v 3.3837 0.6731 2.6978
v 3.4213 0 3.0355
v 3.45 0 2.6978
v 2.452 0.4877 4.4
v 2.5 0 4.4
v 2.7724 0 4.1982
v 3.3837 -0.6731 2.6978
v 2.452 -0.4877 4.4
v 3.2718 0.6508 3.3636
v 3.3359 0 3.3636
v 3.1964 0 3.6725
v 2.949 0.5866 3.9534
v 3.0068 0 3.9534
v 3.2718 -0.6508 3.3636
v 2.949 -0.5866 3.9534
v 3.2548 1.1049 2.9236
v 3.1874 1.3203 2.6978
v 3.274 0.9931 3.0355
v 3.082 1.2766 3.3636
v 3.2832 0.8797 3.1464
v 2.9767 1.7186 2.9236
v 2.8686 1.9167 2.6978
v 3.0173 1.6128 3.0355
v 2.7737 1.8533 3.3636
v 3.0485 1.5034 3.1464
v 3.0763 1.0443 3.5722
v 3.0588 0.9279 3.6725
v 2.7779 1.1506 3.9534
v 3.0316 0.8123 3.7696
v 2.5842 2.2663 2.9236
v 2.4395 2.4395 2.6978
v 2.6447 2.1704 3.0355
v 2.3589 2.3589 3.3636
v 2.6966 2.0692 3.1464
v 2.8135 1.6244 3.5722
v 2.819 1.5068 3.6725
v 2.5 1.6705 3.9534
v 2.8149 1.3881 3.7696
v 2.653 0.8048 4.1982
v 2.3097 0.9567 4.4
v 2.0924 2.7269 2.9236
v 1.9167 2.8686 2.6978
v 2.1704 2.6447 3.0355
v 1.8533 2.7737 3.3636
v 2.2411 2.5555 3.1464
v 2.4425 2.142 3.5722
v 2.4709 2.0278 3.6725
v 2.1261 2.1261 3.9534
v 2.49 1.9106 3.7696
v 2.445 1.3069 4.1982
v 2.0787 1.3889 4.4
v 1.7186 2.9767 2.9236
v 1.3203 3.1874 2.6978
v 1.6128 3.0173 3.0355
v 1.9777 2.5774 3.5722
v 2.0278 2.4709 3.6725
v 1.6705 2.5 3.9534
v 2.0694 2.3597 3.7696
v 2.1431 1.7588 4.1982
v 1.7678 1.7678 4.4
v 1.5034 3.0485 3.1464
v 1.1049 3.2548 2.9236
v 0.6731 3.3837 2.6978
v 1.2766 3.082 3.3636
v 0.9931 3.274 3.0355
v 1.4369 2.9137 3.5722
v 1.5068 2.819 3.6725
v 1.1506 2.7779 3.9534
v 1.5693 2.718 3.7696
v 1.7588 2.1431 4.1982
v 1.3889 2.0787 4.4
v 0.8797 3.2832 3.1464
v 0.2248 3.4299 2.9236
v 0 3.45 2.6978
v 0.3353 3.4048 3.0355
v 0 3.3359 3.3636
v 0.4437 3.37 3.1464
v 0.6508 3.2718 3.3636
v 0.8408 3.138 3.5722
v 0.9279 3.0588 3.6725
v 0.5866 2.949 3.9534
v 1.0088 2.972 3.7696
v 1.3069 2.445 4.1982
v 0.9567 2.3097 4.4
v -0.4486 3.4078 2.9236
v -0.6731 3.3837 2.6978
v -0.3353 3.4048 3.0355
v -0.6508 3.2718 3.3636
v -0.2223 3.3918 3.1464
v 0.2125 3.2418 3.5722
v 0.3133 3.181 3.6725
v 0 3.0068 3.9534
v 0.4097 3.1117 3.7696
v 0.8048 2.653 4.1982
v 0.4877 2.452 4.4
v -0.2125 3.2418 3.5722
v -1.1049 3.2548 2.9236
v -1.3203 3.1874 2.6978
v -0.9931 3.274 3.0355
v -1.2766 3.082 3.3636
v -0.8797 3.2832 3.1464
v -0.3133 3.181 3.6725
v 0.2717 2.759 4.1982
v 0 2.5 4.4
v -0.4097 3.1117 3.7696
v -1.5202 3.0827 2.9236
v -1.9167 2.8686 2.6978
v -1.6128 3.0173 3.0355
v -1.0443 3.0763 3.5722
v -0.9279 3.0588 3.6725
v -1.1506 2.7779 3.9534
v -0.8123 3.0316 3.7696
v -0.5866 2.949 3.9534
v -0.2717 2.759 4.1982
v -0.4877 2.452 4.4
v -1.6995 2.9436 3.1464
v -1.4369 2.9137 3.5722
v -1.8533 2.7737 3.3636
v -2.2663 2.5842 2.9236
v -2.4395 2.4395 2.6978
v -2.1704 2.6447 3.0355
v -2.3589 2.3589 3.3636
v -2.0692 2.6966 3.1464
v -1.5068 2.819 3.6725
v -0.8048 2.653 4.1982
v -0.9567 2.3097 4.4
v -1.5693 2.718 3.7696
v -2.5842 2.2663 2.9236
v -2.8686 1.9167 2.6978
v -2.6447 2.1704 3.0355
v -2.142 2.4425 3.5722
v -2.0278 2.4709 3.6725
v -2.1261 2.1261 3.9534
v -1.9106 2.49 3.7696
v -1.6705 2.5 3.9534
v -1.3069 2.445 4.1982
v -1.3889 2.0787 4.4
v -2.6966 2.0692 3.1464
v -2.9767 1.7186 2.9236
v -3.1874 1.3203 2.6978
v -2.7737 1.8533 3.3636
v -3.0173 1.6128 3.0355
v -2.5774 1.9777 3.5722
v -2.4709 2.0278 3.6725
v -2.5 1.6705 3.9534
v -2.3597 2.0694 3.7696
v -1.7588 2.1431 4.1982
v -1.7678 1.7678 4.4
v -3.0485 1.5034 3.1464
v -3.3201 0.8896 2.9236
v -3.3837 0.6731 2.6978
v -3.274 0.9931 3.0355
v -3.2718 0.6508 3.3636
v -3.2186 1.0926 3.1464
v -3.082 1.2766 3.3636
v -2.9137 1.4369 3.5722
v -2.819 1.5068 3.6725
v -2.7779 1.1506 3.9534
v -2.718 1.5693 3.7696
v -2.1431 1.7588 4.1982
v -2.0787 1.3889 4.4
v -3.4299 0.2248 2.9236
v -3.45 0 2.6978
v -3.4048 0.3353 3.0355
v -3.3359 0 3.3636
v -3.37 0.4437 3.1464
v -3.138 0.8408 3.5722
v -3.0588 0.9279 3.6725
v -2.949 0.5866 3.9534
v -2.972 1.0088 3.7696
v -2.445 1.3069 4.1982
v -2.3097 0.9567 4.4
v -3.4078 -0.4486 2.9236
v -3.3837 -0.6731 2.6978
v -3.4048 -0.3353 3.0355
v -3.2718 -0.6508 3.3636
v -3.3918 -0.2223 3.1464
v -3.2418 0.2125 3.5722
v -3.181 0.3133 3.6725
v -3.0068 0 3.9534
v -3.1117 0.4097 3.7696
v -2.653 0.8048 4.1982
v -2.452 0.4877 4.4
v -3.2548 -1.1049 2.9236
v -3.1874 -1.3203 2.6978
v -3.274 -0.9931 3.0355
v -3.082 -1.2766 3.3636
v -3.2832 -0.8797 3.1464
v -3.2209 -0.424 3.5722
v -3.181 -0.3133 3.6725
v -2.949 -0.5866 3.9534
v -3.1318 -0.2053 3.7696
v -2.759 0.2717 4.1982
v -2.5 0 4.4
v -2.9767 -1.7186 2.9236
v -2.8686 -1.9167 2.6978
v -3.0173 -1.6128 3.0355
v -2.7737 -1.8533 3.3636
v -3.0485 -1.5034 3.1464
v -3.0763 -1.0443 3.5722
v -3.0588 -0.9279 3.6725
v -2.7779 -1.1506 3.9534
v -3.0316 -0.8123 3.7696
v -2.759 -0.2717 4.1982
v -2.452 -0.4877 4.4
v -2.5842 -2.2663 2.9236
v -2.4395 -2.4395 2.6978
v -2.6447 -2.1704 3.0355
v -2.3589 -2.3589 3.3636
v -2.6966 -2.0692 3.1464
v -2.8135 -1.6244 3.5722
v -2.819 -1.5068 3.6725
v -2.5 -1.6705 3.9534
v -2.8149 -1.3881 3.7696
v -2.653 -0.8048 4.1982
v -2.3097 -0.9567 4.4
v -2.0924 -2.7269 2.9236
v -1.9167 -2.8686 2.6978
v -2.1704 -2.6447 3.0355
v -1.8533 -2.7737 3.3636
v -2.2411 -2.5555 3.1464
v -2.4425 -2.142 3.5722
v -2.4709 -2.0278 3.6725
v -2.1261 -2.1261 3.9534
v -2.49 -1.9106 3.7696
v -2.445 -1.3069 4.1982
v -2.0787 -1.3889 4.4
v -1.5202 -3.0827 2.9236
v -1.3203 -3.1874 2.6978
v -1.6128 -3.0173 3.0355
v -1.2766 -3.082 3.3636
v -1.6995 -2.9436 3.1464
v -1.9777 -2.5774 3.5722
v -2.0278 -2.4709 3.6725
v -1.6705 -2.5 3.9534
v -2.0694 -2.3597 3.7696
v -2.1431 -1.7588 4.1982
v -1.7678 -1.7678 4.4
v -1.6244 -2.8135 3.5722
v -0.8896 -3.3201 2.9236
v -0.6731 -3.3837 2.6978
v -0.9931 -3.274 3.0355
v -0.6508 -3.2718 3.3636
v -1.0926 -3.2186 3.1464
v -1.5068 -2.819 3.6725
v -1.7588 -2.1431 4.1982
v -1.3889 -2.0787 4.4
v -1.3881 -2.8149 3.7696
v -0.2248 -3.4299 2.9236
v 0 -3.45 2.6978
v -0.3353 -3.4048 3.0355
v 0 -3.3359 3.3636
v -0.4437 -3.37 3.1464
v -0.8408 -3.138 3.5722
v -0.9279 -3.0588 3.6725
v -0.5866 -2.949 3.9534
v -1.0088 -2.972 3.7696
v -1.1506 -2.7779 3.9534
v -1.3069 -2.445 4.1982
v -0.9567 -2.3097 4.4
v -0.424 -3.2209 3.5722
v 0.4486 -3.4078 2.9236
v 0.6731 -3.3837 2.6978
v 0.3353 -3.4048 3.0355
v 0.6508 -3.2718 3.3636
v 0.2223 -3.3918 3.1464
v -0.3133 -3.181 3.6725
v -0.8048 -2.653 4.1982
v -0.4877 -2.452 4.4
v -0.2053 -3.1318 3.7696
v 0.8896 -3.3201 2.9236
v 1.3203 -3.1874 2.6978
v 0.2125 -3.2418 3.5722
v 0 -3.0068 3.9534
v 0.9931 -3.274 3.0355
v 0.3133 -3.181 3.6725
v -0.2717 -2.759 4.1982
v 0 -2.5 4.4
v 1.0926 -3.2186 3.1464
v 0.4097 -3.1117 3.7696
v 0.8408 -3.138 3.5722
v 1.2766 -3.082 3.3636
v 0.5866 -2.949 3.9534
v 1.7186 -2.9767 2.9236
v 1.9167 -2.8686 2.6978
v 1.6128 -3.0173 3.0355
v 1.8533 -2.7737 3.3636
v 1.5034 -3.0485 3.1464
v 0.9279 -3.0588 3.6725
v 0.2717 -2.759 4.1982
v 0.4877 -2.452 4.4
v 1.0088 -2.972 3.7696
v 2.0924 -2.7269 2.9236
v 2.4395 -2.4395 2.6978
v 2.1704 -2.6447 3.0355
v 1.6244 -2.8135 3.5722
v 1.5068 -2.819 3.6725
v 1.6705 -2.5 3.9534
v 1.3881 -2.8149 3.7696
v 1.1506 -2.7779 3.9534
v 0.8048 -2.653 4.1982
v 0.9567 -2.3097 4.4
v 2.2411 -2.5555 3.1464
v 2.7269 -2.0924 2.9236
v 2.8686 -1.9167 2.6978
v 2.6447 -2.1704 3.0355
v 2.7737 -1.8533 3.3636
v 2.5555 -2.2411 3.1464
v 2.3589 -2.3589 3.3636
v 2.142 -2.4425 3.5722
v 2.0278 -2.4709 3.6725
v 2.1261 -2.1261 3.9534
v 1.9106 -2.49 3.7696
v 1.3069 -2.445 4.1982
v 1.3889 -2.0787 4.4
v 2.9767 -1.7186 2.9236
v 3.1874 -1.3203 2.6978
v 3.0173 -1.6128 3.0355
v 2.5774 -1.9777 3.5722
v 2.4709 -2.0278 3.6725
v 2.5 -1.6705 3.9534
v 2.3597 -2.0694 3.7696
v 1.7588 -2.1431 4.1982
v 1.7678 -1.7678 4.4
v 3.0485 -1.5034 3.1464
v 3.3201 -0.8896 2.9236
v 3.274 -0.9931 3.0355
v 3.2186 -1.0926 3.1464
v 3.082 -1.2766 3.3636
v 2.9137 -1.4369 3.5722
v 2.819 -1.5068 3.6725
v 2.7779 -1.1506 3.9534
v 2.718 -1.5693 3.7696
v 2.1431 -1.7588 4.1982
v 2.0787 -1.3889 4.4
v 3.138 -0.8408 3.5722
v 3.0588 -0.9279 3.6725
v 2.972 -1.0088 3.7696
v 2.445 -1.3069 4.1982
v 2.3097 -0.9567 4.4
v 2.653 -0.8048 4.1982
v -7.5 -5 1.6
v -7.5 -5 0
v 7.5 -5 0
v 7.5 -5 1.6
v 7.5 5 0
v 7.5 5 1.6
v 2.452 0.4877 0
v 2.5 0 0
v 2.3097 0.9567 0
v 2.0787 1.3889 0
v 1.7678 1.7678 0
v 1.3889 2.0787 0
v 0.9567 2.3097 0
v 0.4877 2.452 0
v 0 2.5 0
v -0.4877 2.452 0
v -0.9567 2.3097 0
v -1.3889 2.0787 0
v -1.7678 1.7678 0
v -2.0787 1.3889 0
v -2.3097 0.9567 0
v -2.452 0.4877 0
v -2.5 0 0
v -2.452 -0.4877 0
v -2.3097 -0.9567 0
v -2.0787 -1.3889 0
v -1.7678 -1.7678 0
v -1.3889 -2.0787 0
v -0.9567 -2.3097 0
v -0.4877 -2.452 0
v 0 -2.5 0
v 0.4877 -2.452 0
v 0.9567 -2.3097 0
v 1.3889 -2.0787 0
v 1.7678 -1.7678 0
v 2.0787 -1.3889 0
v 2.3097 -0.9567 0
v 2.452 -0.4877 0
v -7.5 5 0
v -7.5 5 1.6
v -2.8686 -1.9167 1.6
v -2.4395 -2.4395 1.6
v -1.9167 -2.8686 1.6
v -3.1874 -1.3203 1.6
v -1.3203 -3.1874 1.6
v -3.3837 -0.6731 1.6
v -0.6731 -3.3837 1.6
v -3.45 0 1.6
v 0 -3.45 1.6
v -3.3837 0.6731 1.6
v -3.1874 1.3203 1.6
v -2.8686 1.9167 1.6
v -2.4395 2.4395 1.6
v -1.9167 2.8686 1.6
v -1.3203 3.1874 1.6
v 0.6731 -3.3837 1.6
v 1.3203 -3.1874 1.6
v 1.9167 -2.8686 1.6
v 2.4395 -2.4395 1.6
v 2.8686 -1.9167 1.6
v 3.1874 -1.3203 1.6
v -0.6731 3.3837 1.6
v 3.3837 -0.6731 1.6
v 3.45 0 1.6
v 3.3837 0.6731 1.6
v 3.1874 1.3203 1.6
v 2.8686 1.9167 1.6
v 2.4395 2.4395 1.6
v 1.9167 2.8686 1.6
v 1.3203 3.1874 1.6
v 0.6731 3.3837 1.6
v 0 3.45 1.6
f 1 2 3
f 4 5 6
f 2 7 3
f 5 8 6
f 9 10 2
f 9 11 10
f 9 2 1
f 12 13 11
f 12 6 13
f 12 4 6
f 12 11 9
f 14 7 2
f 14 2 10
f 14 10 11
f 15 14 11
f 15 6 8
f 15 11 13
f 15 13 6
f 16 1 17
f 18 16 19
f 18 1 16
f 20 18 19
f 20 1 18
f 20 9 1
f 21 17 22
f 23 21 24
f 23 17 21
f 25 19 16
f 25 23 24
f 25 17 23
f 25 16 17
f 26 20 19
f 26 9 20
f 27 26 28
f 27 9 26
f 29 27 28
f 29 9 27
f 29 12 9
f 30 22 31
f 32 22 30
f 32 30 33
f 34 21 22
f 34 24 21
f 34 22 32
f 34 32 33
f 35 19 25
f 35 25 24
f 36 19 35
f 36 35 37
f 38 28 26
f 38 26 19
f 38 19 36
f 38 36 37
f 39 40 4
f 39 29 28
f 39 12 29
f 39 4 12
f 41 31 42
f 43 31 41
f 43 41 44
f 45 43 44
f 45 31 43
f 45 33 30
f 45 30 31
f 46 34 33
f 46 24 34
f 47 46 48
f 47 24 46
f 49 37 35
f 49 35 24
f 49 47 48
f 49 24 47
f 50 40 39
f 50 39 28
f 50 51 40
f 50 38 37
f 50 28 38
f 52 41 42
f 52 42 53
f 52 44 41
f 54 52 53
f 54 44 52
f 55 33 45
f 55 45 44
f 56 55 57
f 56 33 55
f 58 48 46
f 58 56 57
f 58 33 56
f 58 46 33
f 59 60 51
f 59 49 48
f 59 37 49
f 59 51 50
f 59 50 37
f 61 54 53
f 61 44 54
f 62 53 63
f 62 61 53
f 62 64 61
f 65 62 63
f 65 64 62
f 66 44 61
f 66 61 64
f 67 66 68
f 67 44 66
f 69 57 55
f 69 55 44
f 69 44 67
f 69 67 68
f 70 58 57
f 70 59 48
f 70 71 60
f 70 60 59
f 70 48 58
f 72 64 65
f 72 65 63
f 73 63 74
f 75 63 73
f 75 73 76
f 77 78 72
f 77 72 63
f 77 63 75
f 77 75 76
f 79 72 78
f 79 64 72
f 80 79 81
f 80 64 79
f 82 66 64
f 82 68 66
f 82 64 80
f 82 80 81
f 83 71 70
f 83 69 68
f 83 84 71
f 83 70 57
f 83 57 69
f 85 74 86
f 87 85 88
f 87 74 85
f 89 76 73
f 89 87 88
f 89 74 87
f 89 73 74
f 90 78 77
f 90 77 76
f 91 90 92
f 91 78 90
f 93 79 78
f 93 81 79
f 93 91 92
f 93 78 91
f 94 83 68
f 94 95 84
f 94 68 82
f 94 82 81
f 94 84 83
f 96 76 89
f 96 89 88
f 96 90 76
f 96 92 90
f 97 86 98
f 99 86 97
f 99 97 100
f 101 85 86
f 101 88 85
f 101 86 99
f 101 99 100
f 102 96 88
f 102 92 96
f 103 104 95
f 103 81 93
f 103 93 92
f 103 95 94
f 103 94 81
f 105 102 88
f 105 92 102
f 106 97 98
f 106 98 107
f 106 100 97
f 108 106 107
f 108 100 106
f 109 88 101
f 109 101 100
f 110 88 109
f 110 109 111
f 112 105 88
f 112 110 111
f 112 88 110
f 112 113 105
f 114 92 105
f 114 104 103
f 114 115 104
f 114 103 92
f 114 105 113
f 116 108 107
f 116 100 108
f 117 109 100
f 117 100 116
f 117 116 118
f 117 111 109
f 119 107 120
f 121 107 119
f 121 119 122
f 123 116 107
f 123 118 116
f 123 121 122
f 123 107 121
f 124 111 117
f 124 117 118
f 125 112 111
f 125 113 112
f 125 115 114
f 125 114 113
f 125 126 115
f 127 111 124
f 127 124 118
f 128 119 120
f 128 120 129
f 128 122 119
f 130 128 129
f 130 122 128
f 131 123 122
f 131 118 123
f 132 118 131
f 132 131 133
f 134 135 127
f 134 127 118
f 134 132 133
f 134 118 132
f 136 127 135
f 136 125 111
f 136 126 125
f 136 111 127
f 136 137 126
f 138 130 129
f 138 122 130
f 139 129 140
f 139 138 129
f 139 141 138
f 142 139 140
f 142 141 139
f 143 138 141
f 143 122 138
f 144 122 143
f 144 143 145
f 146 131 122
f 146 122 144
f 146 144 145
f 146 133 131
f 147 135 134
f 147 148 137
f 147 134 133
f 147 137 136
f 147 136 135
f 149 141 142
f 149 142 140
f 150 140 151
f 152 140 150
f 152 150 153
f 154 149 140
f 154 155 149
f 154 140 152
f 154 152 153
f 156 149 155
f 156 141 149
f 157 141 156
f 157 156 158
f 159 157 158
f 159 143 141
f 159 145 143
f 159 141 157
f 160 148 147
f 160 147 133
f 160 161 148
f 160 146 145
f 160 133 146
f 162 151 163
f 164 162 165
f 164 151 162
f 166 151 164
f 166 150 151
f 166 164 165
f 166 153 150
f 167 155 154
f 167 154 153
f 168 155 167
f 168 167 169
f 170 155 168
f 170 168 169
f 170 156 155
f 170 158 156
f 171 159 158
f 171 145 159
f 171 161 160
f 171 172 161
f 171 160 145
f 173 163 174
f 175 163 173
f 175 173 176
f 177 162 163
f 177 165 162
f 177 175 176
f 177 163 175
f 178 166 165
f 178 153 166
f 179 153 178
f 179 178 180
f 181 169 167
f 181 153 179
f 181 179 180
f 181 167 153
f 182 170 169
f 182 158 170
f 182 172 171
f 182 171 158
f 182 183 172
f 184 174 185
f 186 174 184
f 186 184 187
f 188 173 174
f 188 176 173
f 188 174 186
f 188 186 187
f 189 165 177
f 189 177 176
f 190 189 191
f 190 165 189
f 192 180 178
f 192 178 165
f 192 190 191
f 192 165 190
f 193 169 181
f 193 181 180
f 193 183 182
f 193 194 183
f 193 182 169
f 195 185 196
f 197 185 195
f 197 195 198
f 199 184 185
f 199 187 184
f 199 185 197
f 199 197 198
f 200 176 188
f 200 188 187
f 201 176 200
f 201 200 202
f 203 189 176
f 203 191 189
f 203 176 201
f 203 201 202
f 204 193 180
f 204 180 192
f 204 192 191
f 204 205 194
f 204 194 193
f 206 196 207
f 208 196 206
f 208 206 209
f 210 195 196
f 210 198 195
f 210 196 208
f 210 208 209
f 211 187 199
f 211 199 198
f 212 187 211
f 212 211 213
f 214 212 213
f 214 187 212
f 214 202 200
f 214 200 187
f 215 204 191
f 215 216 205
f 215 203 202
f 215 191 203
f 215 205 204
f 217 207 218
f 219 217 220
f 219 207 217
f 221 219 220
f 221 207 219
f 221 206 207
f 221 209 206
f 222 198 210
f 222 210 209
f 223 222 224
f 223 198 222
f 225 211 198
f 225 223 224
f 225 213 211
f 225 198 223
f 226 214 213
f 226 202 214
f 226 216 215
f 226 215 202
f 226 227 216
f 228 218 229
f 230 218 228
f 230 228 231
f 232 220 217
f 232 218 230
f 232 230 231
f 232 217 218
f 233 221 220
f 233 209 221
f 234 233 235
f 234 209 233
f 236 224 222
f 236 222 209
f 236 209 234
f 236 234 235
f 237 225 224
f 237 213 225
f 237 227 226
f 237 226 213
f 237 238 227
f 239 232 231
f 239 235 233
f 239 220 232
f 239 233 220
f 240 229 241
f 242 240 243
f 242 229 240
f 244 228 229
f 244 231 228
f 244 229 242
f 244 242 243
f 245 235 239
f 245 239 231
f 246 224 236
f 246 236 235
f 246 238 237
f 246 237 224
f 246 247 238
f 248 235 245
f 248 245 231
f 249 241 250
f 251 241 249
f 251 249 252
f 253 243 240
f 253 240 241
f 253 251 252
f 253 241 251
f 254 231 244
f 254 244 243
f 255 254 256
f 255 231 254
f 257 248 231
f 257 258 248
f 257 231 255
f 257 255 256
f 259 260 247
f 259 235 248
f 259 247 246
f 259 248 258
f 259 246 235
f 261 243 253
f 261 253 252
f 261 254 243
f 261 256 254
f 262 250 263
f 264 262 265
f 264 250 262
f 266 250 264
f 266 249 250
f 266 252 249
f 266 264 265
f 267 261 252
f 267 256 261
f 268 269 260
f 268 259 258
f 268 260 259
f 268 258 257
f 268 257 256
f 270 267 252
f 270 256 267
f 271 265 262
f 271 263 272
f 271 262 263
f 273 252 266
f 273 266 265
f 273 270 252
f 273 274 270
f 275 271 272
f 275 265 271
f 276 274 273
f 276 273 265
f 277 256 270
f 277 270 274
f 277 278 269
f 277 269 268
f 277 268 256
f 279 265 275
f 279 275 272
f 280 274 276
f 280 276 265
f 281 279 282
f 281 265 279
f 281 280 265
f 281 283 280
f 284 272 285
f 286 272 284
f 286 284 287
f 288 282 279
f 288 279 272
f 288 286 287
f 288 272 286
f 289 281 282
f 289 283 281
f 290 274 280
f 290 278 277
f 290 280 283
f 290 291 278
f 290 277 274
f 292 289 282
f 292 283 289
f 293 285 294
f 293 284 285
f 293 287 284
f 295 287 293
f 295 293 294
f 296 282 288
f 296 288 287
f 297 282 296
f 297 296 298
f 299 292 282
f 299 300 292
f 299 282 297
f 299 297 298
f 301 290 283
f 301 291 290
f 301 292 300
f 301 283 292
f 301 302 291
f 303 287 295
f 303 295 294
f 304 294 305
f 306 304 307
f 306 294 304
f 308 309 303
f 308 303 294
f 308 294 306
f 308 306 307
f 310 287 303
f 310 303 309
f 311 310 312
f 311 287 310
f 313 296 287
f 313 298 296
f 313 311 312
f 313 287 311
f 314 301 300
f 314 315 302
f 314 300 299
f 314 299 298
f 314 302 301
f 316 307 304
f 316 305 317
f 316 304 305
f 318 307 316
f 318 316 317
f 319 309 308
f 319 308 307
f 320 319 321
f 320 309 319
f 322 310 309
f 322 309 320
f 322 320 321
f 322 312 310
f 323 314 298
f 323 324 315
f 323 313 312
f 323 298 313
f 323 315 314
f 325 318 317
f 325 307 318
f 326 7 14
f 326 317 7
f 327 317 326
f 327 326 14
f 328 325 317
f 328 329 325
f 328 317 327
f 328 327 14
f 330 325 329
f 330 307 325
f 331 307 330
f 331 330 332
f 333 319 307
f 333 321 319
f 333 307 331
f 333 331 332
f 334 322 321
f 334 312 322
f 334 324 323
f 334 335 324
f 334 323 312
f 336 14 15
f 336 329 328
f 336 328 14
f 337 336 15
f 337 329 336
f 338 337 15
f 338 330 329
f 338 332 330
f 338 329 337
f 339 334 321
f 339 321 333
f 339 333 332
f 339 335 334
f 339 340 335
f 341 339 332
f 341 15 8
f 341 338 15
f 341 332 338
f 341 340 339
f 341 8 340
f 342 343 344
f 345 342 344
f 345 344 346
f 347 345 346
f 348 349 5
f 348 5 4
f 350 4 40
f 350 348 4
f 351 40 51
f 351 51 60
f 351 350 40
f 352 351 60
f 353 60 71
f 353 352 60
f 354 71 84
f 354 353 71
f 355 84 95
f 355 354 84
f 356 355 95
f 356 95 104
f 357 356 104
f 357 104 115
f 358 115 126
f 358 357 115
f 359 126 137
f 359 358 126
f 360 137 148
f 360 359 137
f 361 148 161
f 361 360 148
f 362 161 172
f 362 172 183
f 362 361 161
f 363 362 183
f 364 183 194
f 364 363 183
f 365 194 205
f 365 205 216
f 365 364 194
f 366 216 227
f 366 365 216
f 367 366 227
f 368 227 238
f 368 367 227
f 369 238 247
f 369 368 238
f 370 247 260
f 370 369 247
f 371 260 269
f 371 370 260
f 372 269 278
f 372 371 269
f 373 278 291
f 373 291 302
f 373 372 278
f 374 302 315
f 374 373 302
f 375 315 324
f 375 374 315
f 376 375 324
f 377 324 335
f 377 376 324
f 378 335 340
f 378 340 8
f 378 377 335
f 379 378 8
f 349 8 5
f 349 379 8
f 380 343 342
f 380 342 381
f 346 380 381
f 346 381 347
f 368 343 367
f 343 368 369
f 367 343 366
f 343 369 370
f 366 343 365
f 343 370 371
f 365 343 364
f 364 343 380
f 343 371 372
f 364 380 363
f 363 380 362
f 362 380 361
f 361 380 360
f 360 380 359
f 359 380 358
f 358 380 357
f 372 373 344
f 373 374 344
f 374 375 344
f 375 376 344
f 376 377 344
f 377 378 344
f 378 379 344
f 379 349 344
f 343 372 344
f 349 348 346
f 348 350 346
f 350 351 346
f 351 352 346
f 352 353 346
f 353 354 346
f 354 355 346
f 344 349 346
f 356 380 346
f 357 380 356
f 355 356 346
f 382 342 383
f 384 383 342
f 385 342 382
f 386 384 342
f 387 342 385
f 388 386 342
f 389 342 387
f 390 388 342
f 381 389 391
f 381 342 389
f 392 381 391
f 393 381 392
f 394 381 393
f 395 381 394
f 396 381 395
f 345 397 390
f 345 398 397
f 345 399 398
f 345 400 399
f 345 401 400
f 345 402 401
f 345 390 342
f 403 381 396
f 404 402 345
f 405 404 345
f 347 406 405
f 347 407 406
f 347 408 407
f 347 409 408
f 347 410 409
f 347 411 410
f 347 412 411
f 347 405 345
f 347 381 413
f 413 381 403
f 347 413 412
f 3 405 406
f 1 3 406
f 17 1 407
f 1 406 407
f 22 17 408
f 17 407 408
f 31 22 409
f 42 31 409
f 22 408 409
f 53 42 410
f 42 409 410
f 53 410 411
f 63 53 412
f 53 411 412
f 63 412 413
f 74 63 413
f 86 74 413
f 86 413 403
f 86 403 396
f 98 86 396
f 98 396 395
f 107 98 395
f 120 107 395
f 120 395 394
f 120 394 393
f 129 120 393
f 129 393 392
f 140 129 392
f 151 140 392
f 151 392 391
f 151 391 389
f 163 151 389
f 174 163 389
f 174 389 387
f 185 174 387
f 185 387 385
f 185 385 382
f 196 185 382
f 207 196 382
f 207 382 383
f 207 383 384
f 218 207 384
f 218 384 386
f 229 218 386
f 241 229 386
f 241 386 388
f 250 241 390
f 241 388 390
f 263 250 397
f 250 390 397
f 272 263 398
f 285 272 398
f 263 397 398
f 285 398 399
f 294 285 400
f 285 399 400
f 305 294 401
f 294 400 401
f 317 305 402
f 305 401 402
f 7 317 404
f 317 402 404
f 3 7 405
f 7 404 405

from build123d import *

# Parameters (mm, degrees)
SKETCH1_R           = 3.45
SKETCH1_R_2         = 2.5
BOSS_EXTRUDE1_DEPTH = 4.4
SKETCH1_3_W         = 15
SKETCH1_3_H         = 10
SKETCH1_3_R         = 3.45
BOSS_EXTRUDE2_DEPTH = 1.6
FILLET1_R           = 2


with BuildPart() as part:
    # Sketch1 → Boss-Extrude1 (new body)
    with BuildSketch(Plane.XY):
        Circle(SKETCH1_R)
        Circle(SKETCH1_R_2, mode=Mode.SUBTRACT)
    extrude(amount=BOSS_EXTRUDE1_DEPTH)

    # Sketch1<3> → Boss-Extrude2 (add)
    with BuildSketch(Plane.XY):
        Rectangle(SKETCH1_3_W, SKETCH1_3_H)
        Circle(SKETCH1_3_R, mode=Mode.SUBTRACT)
    extrude(amount=BOSS_EXTRUDE2_DEPTH)

    # Fillet1
    # the kernel refuses this fillet: 2 mm, written as the material it takes off along each edge
    with BuildSketch(Plane(origin=(0, 0, 4.4), x_dir=(1, 0, 0), z_dir=(0, -1, 0))) as fillet1_piece_1:
        with BuildLine():
            CenterArc((1.45, -1.702204453), FILLET1_R, 0, 58.331756746)
            Line((2.5, 0), (2.521, 0.034044089))
            ThreePointArc((2.521, 0.034044089), (2.975, 0.04), (3.45, 0.04))
            Line((3.45, 0.04), (3.49, 0))
            Line((3.49, 0), (3.49, -1.702204453))
            Line((3.49, -1.702204453), (3.45, -1.702204453))
        make_face()
    revolve(axis=Axis((0, 0, 4.4), (0, 0, 1)), mode=Mode.SUBTRACT)


solid = part.part
